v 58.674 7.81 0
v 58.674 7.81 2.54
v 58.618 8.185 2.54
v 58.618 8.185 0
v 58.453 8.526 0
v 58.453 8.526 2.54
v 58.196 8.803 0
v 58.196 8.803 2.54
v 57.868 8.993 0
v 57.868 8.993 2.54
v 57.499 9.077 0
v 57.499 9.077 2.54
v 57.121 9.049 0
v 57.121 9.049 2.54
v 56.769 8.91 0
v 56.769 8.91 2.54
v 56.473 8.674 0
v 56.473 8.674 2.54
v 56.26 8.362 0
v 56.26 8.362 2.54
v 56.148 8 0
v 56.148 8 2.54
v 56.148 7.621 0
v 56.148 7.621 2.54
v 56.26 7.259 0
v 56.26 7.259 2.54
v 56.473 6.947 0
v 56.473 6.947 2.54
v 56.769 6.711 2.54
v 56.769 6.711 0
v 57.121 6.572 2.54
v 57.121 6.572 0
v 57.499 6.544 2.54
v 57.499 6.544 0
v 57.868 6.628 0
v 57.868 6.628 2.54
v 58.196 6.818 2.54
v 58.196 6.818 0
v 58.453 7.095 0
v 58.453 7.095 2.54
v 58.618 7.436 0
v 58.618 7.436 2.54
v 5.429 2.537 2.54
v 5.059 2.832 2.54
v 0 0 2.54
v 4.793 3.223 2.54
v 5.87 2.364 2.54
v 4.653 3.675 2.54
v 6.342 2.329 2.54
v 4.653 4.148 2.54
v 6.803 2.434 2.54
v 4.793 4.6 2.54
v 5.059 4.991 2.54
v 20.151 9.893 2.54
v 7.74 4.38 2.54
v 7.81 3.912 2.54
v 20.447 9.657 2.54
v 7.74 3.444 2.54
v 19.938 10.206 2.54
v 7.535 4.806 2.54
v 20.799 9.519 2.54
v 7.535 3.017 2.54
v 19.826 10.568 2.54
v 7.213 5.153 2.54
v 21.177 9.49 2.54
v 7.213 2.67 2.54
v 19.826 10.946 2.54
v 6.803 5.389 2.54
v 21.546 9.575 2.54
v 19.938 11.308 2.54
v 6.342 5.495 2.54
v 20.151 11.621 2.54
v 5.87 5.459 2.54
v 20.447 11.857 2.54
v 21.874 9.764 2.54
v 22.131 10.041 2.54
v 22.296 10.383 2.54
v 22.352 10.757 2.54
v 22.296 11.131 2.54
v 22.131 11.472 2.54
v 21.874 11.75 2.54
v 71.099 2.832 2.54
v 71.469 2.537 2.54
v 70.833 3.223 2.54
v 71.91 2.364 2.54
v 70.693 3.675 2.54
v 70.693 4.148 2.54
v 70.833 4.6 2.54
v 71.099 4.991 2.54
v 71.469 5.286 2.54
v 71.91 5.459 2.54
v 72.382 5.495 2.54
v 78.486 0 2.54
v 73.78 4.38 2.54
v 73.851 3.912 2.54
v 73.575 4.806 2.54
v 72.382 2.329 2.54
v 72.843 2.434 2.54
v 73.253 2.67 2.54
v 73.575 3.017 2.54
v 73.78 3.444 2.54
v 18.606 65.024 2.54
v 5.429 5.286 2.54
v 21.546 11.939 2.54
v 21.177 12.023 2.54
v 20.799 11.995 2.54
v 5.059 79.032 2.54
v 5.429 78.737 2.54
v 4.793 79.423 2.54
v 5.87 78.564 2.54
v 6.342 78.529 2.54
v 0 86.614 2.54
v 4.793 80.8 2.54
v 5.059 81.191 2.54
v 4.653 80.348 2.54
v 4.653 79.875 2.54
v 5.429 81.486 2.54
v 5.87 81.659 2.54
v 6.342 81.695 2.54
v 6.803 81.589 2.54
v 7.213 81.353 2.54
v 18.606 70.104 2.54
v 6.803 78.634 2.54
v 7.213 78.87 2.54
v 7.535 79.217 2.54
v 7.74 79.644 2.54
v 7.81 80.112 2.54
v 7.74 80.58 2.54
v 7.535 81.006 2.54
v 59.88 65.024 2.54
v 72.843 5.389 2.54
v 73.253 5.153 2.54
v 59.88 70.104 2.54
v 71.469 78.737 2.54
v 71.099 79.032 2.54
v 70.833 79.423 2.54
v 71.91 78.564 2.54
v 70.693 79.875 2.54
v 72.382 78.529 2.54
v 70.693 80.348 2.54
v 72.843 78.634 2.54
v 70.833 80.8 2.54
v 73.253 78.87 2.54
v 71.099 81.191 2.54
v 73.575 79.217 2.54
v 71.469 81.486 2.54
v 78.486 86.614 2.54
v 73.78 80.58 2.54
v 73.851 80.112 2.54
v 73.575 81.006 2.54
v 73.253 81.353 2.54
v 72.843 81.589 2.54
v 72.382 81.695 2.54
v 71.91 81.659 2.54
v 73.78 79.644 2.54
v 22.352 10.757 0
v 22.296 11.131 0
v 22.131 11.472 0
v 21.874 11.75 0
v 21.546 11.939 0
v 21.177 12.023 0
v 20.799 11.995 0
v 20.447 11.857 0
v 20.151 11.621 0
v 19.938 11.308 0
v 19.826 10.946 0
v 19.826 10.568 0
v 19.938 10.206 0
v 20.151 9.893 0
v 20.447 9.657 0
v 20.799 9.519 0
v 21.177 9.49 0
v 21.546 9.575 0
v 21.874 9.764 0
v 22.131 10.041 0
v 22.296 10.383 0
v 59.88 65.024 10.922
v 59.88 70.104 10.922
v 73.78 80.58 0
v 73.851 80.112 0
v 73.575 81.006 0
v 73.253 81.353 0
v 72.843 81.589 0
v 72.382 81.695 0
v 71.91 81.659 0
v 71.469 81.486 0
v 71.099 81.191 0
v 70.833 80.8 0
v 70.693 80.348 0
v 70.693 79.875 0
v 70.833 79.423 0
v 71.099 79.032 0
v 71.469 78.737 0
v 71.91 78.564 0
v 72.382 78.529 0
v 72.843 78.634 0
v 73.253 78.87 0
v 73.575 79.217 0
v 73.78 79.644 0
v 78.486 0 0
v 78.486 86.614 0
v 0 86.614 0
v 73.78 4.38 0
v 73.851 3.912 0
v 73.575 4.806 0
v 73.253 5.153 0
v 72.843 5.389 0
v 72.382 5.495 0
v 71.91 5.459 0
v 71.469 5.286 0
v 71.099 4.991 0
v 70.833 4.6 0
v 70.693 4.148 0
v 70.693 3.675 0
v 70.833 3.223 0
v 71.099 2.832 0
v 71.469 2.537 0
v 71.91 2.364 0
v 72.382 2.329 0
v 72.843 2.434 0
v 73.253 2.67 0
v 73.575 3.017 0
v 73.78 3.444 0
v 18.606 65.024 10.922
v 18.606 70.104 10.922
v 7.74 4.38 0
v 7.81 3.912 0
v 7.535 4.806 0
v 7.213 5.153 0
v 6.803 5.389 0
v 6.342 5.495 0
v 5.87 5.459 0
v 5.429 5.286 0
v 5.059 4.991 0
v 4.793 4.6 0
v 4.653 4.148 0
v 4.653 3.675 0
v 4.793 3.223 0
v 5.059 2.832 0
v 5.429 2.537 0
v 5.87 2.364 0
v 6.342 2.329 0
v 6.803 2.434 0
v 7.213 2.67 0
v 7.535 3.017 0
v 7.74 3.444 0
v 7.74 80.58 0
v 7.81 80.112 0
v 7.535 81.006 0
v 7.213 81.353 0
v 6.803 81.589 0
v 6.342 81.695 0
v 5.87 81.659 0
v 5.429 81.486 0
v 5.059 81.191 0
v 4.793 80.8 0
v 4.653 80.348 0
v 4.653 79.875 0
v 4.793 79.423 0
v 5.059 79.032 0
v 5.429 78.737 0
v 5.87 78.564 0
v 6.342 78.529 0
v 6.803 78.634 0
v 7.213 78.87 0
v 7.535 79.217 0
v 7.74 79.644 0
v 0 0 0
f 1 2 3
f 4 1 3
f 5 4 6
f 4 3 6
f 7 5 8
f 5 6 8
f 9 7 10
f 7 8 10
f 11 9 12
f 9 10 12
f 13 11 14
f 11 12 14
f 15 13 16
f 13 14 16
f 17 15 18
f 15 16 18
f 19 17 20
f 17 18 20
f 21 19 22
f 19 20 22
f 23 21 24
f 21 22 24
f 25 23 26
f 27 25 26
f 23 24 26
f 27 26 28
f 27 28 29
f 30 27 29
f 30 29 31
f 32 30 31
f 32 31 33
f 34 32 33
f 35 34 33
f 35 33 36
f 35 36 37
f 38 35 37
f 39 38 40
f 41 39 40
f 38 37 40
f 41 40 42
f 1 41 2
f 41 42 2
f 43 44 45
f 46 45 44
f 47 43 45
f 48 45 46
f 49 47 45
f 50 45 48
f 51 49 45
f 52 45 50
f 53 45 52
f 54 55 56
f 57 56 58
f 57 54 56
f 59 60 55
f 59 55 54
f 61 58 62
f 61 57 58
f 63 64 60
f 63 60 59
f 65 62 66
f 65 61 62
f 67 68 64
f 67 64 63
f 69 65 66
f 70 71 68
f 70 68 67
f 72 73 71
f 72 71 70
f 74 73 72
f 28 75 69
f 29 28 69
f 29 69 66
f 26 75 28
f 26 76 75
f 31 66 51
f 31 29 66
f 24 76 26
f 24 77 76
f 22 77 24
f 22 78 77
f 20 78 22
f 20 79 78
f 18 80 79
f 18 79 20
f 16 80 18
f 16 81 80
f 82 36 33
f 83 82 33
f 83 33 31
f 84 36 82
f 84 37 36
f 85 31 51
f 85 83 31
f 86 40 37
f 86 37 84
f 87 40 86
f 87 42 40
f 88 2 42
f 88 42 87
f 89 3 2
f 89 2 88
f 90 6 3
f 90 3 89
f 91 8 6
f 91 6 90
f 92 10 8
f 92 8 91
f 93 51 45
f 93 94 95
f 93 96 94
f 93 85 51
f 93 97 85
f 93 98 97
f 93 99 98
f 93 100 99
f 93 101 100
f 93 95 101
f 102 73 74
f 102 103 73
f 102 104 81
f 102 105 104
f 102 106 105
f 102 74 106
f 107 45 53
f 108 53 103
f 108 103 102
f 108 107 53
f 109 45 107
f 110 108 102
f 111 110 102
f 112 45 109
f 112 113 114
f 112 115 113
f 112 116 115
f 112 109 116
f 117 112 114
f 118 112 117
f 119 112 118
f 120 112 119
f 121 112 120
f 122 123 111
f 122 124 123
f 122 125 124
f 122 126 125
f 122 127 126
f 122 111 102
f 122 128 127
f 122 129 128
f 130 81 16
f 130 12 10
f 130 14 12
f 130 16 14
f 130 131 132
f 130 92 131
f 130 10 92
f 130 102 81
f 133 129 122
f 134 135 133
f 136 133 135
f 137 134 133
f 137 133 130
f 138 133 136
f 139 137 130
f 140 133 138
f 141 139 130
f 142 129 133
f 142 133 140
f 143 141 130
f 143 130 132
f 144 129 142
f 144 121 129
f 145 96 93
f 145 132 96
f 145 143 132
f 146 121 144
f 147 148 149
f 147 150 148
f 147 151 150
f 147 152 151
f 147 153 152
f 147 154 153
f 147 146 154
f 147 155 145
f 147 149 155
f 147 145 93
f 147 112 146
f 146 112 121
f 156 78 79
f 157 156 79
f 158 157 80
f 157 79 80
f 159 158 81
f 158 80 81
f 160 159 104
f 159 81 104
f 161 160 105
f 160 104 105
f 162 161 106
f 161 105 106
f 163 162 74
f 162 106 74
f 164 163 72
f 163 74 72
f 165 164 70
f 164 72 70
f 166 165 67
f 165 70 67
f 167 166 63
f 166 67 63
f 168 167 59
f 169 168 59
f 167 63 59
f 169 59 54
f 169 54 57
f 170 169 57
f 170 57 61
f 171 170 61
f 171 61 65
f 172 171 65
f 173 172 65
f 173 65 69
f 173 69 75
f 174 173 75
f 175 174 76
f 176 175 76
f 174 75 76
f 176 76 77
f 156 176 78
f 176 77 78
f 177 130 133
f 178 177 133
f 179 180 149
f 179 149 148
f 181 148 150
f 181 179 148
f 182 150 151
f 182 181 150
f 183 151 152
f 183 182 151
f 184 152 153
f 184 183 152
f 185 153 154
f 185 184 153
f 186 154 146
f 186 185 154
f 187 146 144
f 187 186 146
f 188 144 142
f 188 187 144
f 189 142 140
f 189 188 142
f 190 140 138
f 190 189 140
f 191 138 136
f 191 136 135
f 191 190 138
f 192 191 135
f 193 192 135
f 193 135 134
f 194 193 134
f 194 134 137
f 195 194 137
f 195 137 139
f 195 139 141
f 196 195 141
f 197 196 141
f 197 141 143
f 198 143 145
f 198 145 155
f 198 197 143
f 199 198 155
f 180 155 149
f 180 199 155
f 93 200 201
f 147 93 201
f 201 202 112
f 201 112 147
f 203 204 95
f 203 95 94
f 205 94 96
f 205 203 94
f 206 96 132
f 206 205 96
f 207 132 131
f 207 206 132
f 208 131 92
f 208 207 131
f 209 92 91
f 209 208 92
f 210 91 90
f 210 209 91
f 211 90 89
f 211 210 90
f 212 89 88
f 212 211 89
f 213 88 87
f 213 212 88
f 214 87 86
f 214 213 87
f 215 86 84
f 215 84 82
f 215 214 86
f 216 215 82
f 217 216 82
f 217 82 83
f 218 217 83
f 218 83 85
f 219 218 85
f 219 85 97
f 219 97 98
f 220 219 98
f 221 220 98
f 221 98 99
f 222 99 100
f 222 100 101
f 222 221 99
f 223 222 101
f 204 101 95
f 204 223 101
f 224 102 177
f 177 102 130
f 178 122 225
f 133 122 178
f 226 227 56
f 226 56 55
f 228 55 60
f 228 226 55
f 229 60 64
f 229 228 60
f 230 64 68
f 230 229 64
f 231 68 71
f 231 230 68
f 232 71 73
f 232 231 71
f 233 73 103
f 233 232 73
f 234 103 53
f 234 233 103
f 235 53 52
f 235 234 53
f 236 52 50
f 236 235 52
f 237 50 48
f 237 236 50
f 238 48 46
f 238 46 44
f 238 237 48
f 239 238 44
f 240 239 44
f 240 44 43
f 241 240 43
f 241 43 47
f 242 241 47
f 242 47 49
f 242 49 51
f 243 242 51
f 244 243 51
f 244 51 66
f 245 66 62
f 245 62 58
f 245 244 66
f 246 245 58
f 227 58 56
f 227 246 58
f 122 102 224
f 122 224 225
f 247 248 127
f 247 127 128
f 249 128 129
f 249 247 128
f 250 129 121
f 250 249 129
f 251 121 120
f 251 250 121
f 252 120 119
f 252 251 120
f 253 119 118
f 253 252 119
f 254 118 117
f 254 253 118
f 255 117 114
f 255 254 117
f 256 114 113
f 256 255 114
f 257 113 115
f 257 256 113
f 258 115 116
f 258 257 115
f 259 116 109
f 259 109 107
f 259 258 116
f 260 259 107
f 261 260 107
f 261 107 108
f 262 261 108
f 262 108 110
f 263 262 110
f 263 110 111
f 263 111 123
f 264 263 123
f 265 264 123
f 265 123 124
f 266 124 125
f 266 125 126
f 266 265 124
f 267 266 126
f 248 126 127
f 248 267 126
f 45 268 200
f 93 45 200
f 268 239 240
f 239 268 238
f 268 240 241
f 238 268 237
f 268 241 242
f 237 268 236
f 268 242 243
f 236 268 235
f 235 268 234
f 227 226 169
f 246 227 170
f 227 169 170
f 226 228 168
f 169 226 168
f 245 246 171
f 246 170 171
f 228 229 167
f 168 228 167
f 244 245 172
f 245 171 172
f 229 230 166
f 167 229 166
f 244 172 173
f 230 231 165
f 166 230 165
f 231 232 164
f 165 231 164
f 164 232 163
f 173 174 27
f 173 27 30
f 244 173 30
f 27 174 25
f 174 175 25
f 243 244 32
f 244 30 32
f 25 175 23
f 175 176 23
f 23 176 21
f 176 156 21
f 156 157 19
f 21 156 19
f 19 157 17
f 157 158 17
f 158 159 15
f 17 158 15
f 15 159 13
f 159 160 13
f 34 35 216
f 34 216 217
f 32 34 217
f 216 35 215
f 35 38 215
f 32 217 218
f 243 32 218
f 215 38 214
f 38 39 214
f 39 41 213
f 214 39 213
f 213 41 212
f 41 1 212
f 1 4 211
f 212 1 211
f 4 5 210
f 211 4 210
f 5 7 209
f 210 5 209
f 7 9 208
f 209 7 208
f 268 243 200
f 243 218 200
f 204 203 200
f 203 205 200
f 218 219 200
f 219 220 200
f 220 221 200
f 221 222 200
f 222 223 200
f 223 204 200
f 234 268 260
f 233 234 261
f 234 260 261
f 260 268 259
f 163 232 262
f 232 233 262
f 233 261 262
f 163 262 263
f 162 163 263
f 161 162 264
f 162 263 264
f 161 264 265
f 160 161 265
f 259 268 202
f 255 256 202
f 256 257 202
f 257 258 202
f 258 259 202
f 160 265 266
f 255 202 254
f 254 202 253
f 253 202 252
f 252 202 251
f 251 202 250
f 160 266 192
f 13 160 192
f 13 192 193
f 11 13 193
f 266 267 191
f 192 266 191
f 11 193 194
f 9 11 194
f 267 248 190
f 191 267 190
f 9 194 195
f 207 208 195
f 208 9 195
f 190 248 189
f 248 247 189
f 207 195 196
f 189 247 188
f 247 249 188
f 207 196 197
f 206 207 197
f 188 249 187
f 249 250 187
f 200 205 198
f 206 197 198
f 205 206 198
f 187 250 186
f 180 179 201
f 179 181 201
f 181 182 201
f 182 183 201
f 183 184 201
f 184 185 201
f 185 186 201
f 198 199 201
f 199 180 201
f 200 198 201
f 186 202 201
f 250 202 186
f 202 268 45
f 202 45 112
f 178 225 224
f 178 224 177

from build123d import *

# Parameters (mm, degrees)
SKETCH1_W           = 78.486
SKETCH1_H           = 86.614
SKETCH1_R           = 1.5875
BOSS_EXTRUDE1_DEPTH = 2.54
SKETCH2_W           = 41.275
SKETCH2_H           = 5.08
BOSS_EXTRUDE2_DEPTH = 8.382
SKETCH4_R           = 1.27
CUT_EXTRUDE1_DEPTH  = 2.54


with BuildPart() as part:
    # Sketch1 → Boss-Extrude1 (new body)
    with BuildSketch(Plane.XY):
        with Locations((39.243, 43.307)):
            Rectangle(SKETCH1_W, SKETCH1_H)
        with Locations((6.223, 80.1116)):
            Circle(SKETCH1_R, mode=Mode.SUBTRACT)
        with Locations((72.263, 80.1116)):
            Circle(SKETCH1_R, mode=Mode.SUBTRACT)
        with Locations((72.263, 3.9116)):
            Circle(SKETCH1_R, mode=Mode.SUBTRACT)
        with Locations((6.223, 3.9116)):
            Circle(SKETCH1_R, mode=Mode.SUBTRACT)
    extrude(amount=BOSS_EXTRUDE1_DEPTH)

    # Sketch2 → Boss-Extrude2 (add)
    with BuildSketch(Plane.XY.offset(2.54)):
        with Locations((39.243, 67.564)):
            Rectangle(SKETCH2_W, SKETCH2_H)
    extrude(amount=BOSS_EXTRUDE2_DEPTH)

    # Sketch4 → Cut-Extrude1 (cut)
    with BuildSketch(Plane.XY.offset(2.54)):
        with Locations((21.082, 10.7569)):
            Circle(SKETCH4_R)
        with Locations((57.404, 7.8105)):
            Circle(SKETCH4_R)
    extrude(amount=-CUT_EXTRUDE1_DEPTH, mode=Mode.SUBTRACT)


solid = part.part
